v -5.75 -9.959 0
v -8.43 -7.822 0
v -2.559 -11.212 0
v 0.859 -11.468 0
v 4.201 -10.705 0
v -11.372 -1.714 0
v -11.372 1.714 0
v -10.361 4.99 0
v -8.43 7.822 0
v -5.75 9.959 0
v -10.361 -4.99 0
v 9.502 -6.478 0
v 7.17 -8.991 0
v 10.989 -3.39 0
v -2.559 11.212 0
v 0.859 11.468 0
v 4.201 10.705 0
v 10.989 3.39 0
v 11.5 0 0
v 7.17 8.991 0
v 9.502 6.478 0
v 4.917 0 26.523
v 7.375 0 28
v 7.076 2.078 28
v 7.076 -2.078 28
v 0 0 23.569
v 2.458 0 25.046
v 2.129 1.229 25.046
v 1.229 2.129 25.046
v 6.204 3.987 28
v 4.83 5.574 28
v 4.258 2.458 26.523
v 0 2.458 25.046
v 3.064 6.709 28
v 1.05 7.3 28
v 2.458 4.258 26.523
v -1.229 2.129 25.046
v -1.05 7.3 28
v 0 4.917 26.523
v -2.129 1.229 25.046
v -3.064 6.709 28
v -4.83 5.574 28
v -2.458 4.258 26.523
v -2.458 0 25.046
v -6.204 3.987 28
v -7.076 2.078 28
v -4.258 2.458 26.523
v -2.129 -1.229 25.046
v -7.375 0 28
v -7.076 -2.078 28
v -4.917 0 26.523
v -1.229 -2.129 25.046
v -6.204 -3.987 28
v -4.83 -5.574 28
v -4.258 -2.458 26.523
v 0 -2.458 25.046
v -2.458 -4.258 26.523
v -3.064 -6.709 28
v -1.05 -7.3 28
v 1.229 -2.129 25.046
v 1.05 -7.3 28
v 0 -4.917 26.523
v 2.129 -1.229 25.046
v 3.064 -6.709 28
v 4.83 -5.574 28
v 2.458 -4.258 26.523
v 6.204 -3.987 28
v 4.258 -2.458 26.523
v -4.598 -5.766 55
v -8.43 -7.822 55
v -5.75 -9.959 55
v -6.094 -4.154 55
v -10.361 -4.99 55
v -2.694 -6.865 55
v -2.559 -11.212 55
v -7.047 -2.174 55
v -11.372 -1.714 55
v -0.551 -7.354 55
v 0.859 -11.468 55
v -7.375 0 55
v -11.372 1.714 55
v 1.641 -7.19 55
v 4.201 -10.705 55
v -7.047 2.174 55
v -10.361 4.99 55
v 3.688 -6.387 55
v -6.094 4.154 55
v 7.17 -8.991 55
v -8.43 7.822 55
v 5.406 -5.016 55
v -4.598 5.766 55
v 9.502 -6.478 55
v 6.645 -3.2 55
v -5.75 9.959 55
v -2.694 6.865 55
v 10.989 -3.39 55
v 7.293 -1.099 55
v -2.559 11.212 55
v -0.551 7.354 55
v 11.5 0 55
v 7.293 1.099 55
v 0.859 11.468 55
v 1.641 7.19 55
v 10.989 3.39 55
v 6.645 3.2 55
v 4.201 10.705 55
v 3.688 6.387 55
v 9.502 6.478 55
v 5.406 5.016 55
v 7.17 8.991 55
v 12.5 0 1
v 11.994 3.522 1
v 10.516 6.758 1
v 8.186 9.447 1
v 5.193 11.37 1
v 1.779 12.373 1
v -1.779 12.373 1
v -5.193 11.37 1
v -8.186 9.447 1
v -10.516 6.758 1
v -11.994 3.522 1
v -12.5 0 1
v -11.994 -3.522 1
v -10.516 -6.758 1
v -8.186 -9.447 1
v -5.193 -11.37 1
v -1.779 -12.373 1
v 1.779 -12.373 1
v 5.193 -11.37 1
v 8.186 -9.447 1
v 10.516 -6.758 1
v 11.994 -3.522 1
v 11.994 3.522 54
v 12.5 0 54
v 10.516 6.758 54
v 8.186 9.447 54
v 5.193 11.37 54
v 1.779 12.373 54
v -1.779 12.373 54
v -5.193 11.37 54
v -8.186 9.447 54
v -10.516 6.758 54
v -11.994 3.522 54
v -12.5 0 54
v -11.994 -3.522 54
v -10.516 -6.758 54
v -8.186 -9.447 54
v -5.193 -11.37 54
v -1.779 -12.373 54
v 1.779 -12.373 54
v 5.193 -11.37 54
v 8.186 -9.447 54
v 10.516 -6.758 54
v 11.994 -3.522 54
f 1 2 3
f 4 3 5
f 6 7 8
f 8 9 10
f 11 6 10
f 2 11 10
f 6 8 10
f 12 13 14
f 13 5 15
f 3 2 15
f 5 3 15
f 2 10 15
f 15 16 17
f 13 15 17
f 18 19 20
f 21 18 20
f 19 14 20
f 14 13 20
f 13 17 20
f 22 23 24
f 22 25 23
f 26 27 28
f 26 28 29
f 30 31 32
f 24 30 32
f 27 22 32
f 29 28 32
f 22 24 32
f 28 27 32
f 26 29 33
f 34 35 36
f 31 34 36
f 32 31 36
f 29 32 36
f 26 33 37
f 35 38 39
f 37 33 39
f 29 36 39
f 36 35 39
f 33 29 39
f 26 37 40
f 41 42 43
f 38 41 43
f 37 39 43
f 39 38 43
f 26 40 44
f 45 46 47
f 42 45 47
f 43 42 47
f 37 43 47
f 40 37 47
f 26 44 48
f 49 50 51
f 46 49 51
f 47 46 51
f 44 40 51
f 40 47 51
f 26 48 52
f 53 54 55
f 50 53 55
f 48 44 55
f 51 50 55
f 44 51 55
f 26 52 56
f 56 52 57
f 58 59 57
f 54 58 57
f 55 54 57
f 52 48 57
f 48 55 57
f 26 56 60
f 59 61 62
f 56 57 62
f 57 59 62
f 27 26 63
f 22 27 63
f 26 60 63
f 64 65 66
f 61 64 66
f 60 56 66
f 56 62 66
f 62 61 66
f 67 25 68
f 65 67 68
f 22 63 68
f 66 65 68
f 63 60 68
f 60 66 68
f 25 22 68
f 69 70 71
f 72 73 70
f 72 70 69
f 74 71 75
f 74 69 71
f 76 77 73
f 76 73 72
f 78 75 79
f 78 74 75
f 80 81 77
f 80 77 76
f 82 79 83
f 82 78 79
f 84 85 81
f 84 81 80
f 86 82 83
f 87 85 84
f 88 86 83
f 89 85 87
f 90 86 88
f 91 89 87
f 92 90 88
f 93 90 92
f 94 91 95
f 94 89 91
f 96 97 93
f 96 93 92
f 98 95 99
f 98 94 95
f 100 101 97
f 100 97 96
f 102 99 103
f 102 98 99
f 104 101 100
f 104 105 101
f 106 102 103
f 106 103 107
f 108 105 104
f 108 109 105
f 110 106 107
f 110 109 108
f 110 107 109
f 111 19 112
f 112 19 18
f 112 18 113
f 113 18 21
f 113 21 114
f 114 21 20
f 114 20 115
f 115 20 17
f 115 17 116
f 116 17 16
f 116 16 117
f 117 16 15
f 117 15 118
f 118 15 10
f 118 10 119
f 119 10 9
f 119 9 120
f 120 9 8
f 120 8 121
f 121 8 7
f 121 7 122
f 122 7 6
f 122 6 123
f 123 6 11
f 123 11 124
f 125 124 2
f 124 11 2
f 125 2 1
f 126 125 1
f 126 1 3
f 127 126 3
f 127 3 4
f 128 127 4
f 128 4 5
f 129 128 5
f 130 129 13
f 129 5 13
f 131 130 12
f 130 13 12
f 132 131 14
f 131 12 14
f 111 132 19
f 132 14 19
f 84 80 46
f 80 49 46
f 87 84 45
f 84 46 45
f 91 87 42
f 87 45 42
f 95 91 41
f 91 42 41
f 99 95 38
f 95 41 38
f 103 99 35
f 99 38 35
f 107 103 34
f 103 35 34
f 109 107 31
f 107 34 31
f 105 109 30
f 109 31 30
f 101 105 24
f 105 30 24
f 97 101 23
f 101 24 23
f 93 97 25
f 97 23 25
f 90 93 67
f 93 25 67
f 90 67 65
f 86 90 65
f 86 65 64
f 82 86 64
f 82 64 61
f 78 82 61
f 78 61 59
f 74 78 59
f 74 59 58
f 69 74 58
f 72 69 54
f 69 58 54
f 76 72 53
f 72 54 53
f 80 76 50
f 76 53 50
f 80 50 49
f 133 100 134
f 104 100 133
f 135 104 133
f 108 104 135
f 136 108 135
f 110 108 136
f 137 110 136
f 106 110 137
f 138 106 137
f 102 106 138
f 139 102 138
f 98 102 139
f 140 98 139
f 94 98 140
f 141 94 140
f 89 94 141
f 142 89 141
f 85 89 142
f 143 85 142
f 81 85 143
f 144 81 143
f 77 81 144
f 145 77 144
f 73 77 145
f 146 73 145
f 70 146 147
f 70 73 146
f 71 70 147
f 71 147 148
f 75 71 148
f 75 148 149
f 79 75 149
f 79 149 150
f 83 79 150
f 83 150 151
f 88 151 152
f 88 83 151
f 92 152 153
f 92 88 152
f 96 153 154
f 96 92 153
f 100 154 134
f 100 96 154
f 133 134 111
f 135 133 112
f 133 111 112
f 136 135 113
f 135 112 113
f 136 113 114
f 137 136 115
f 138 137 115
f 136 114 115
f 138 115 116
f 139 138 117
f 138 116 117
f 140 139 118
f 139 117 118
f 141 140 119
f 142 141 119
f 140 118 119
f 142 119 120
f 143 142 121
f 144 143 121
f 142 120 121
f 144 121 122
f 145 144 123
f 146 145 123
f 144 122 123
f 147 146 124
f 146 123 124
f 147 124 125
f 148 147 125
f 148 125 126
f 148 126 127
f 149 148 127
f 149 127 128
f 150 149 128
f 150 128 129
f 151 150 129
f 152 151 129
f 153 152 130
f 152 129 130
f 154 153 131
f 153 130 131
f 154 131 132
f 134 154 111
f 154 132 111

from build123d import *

# Parameters (mm, degrees)
F0_R     = 12.5
F1_DEPTH = 55
F2_SIZE  = 1
F4_D     = 14.75
F4_DEPTH = 27
F4_TIP   = 4.4313470653


with BuildPart() as f1:
    # F0 (on Top) → F1 (new body)
    with BuildSketch(Plane.XY):
        Circle(F0_R)
    extrude(amount=F1_DEPTH)

    # F2
    f2_edges = [f1.edges().sort_by_distance(p)[0] for p in [
        (-12.5, 0, 0),
        (-12.5, 0, 55),
    ]]
    chamfer(f2_edges, length=F2_SIZE)

    # F4
    with Locations(Plane.XY.offset(55)):
        with Locations((0, 0)):
            Hole(F4_D / 2, depth=F4_DEPTH)
            with Locations((0, 0, -(F4_DEPTH + F4_TIP / 2))):  # 118° drill point
                Cone(0, F4_D / 2, F4_TIP, mode=Mode.SUBTRACT)


solid = f1.part
